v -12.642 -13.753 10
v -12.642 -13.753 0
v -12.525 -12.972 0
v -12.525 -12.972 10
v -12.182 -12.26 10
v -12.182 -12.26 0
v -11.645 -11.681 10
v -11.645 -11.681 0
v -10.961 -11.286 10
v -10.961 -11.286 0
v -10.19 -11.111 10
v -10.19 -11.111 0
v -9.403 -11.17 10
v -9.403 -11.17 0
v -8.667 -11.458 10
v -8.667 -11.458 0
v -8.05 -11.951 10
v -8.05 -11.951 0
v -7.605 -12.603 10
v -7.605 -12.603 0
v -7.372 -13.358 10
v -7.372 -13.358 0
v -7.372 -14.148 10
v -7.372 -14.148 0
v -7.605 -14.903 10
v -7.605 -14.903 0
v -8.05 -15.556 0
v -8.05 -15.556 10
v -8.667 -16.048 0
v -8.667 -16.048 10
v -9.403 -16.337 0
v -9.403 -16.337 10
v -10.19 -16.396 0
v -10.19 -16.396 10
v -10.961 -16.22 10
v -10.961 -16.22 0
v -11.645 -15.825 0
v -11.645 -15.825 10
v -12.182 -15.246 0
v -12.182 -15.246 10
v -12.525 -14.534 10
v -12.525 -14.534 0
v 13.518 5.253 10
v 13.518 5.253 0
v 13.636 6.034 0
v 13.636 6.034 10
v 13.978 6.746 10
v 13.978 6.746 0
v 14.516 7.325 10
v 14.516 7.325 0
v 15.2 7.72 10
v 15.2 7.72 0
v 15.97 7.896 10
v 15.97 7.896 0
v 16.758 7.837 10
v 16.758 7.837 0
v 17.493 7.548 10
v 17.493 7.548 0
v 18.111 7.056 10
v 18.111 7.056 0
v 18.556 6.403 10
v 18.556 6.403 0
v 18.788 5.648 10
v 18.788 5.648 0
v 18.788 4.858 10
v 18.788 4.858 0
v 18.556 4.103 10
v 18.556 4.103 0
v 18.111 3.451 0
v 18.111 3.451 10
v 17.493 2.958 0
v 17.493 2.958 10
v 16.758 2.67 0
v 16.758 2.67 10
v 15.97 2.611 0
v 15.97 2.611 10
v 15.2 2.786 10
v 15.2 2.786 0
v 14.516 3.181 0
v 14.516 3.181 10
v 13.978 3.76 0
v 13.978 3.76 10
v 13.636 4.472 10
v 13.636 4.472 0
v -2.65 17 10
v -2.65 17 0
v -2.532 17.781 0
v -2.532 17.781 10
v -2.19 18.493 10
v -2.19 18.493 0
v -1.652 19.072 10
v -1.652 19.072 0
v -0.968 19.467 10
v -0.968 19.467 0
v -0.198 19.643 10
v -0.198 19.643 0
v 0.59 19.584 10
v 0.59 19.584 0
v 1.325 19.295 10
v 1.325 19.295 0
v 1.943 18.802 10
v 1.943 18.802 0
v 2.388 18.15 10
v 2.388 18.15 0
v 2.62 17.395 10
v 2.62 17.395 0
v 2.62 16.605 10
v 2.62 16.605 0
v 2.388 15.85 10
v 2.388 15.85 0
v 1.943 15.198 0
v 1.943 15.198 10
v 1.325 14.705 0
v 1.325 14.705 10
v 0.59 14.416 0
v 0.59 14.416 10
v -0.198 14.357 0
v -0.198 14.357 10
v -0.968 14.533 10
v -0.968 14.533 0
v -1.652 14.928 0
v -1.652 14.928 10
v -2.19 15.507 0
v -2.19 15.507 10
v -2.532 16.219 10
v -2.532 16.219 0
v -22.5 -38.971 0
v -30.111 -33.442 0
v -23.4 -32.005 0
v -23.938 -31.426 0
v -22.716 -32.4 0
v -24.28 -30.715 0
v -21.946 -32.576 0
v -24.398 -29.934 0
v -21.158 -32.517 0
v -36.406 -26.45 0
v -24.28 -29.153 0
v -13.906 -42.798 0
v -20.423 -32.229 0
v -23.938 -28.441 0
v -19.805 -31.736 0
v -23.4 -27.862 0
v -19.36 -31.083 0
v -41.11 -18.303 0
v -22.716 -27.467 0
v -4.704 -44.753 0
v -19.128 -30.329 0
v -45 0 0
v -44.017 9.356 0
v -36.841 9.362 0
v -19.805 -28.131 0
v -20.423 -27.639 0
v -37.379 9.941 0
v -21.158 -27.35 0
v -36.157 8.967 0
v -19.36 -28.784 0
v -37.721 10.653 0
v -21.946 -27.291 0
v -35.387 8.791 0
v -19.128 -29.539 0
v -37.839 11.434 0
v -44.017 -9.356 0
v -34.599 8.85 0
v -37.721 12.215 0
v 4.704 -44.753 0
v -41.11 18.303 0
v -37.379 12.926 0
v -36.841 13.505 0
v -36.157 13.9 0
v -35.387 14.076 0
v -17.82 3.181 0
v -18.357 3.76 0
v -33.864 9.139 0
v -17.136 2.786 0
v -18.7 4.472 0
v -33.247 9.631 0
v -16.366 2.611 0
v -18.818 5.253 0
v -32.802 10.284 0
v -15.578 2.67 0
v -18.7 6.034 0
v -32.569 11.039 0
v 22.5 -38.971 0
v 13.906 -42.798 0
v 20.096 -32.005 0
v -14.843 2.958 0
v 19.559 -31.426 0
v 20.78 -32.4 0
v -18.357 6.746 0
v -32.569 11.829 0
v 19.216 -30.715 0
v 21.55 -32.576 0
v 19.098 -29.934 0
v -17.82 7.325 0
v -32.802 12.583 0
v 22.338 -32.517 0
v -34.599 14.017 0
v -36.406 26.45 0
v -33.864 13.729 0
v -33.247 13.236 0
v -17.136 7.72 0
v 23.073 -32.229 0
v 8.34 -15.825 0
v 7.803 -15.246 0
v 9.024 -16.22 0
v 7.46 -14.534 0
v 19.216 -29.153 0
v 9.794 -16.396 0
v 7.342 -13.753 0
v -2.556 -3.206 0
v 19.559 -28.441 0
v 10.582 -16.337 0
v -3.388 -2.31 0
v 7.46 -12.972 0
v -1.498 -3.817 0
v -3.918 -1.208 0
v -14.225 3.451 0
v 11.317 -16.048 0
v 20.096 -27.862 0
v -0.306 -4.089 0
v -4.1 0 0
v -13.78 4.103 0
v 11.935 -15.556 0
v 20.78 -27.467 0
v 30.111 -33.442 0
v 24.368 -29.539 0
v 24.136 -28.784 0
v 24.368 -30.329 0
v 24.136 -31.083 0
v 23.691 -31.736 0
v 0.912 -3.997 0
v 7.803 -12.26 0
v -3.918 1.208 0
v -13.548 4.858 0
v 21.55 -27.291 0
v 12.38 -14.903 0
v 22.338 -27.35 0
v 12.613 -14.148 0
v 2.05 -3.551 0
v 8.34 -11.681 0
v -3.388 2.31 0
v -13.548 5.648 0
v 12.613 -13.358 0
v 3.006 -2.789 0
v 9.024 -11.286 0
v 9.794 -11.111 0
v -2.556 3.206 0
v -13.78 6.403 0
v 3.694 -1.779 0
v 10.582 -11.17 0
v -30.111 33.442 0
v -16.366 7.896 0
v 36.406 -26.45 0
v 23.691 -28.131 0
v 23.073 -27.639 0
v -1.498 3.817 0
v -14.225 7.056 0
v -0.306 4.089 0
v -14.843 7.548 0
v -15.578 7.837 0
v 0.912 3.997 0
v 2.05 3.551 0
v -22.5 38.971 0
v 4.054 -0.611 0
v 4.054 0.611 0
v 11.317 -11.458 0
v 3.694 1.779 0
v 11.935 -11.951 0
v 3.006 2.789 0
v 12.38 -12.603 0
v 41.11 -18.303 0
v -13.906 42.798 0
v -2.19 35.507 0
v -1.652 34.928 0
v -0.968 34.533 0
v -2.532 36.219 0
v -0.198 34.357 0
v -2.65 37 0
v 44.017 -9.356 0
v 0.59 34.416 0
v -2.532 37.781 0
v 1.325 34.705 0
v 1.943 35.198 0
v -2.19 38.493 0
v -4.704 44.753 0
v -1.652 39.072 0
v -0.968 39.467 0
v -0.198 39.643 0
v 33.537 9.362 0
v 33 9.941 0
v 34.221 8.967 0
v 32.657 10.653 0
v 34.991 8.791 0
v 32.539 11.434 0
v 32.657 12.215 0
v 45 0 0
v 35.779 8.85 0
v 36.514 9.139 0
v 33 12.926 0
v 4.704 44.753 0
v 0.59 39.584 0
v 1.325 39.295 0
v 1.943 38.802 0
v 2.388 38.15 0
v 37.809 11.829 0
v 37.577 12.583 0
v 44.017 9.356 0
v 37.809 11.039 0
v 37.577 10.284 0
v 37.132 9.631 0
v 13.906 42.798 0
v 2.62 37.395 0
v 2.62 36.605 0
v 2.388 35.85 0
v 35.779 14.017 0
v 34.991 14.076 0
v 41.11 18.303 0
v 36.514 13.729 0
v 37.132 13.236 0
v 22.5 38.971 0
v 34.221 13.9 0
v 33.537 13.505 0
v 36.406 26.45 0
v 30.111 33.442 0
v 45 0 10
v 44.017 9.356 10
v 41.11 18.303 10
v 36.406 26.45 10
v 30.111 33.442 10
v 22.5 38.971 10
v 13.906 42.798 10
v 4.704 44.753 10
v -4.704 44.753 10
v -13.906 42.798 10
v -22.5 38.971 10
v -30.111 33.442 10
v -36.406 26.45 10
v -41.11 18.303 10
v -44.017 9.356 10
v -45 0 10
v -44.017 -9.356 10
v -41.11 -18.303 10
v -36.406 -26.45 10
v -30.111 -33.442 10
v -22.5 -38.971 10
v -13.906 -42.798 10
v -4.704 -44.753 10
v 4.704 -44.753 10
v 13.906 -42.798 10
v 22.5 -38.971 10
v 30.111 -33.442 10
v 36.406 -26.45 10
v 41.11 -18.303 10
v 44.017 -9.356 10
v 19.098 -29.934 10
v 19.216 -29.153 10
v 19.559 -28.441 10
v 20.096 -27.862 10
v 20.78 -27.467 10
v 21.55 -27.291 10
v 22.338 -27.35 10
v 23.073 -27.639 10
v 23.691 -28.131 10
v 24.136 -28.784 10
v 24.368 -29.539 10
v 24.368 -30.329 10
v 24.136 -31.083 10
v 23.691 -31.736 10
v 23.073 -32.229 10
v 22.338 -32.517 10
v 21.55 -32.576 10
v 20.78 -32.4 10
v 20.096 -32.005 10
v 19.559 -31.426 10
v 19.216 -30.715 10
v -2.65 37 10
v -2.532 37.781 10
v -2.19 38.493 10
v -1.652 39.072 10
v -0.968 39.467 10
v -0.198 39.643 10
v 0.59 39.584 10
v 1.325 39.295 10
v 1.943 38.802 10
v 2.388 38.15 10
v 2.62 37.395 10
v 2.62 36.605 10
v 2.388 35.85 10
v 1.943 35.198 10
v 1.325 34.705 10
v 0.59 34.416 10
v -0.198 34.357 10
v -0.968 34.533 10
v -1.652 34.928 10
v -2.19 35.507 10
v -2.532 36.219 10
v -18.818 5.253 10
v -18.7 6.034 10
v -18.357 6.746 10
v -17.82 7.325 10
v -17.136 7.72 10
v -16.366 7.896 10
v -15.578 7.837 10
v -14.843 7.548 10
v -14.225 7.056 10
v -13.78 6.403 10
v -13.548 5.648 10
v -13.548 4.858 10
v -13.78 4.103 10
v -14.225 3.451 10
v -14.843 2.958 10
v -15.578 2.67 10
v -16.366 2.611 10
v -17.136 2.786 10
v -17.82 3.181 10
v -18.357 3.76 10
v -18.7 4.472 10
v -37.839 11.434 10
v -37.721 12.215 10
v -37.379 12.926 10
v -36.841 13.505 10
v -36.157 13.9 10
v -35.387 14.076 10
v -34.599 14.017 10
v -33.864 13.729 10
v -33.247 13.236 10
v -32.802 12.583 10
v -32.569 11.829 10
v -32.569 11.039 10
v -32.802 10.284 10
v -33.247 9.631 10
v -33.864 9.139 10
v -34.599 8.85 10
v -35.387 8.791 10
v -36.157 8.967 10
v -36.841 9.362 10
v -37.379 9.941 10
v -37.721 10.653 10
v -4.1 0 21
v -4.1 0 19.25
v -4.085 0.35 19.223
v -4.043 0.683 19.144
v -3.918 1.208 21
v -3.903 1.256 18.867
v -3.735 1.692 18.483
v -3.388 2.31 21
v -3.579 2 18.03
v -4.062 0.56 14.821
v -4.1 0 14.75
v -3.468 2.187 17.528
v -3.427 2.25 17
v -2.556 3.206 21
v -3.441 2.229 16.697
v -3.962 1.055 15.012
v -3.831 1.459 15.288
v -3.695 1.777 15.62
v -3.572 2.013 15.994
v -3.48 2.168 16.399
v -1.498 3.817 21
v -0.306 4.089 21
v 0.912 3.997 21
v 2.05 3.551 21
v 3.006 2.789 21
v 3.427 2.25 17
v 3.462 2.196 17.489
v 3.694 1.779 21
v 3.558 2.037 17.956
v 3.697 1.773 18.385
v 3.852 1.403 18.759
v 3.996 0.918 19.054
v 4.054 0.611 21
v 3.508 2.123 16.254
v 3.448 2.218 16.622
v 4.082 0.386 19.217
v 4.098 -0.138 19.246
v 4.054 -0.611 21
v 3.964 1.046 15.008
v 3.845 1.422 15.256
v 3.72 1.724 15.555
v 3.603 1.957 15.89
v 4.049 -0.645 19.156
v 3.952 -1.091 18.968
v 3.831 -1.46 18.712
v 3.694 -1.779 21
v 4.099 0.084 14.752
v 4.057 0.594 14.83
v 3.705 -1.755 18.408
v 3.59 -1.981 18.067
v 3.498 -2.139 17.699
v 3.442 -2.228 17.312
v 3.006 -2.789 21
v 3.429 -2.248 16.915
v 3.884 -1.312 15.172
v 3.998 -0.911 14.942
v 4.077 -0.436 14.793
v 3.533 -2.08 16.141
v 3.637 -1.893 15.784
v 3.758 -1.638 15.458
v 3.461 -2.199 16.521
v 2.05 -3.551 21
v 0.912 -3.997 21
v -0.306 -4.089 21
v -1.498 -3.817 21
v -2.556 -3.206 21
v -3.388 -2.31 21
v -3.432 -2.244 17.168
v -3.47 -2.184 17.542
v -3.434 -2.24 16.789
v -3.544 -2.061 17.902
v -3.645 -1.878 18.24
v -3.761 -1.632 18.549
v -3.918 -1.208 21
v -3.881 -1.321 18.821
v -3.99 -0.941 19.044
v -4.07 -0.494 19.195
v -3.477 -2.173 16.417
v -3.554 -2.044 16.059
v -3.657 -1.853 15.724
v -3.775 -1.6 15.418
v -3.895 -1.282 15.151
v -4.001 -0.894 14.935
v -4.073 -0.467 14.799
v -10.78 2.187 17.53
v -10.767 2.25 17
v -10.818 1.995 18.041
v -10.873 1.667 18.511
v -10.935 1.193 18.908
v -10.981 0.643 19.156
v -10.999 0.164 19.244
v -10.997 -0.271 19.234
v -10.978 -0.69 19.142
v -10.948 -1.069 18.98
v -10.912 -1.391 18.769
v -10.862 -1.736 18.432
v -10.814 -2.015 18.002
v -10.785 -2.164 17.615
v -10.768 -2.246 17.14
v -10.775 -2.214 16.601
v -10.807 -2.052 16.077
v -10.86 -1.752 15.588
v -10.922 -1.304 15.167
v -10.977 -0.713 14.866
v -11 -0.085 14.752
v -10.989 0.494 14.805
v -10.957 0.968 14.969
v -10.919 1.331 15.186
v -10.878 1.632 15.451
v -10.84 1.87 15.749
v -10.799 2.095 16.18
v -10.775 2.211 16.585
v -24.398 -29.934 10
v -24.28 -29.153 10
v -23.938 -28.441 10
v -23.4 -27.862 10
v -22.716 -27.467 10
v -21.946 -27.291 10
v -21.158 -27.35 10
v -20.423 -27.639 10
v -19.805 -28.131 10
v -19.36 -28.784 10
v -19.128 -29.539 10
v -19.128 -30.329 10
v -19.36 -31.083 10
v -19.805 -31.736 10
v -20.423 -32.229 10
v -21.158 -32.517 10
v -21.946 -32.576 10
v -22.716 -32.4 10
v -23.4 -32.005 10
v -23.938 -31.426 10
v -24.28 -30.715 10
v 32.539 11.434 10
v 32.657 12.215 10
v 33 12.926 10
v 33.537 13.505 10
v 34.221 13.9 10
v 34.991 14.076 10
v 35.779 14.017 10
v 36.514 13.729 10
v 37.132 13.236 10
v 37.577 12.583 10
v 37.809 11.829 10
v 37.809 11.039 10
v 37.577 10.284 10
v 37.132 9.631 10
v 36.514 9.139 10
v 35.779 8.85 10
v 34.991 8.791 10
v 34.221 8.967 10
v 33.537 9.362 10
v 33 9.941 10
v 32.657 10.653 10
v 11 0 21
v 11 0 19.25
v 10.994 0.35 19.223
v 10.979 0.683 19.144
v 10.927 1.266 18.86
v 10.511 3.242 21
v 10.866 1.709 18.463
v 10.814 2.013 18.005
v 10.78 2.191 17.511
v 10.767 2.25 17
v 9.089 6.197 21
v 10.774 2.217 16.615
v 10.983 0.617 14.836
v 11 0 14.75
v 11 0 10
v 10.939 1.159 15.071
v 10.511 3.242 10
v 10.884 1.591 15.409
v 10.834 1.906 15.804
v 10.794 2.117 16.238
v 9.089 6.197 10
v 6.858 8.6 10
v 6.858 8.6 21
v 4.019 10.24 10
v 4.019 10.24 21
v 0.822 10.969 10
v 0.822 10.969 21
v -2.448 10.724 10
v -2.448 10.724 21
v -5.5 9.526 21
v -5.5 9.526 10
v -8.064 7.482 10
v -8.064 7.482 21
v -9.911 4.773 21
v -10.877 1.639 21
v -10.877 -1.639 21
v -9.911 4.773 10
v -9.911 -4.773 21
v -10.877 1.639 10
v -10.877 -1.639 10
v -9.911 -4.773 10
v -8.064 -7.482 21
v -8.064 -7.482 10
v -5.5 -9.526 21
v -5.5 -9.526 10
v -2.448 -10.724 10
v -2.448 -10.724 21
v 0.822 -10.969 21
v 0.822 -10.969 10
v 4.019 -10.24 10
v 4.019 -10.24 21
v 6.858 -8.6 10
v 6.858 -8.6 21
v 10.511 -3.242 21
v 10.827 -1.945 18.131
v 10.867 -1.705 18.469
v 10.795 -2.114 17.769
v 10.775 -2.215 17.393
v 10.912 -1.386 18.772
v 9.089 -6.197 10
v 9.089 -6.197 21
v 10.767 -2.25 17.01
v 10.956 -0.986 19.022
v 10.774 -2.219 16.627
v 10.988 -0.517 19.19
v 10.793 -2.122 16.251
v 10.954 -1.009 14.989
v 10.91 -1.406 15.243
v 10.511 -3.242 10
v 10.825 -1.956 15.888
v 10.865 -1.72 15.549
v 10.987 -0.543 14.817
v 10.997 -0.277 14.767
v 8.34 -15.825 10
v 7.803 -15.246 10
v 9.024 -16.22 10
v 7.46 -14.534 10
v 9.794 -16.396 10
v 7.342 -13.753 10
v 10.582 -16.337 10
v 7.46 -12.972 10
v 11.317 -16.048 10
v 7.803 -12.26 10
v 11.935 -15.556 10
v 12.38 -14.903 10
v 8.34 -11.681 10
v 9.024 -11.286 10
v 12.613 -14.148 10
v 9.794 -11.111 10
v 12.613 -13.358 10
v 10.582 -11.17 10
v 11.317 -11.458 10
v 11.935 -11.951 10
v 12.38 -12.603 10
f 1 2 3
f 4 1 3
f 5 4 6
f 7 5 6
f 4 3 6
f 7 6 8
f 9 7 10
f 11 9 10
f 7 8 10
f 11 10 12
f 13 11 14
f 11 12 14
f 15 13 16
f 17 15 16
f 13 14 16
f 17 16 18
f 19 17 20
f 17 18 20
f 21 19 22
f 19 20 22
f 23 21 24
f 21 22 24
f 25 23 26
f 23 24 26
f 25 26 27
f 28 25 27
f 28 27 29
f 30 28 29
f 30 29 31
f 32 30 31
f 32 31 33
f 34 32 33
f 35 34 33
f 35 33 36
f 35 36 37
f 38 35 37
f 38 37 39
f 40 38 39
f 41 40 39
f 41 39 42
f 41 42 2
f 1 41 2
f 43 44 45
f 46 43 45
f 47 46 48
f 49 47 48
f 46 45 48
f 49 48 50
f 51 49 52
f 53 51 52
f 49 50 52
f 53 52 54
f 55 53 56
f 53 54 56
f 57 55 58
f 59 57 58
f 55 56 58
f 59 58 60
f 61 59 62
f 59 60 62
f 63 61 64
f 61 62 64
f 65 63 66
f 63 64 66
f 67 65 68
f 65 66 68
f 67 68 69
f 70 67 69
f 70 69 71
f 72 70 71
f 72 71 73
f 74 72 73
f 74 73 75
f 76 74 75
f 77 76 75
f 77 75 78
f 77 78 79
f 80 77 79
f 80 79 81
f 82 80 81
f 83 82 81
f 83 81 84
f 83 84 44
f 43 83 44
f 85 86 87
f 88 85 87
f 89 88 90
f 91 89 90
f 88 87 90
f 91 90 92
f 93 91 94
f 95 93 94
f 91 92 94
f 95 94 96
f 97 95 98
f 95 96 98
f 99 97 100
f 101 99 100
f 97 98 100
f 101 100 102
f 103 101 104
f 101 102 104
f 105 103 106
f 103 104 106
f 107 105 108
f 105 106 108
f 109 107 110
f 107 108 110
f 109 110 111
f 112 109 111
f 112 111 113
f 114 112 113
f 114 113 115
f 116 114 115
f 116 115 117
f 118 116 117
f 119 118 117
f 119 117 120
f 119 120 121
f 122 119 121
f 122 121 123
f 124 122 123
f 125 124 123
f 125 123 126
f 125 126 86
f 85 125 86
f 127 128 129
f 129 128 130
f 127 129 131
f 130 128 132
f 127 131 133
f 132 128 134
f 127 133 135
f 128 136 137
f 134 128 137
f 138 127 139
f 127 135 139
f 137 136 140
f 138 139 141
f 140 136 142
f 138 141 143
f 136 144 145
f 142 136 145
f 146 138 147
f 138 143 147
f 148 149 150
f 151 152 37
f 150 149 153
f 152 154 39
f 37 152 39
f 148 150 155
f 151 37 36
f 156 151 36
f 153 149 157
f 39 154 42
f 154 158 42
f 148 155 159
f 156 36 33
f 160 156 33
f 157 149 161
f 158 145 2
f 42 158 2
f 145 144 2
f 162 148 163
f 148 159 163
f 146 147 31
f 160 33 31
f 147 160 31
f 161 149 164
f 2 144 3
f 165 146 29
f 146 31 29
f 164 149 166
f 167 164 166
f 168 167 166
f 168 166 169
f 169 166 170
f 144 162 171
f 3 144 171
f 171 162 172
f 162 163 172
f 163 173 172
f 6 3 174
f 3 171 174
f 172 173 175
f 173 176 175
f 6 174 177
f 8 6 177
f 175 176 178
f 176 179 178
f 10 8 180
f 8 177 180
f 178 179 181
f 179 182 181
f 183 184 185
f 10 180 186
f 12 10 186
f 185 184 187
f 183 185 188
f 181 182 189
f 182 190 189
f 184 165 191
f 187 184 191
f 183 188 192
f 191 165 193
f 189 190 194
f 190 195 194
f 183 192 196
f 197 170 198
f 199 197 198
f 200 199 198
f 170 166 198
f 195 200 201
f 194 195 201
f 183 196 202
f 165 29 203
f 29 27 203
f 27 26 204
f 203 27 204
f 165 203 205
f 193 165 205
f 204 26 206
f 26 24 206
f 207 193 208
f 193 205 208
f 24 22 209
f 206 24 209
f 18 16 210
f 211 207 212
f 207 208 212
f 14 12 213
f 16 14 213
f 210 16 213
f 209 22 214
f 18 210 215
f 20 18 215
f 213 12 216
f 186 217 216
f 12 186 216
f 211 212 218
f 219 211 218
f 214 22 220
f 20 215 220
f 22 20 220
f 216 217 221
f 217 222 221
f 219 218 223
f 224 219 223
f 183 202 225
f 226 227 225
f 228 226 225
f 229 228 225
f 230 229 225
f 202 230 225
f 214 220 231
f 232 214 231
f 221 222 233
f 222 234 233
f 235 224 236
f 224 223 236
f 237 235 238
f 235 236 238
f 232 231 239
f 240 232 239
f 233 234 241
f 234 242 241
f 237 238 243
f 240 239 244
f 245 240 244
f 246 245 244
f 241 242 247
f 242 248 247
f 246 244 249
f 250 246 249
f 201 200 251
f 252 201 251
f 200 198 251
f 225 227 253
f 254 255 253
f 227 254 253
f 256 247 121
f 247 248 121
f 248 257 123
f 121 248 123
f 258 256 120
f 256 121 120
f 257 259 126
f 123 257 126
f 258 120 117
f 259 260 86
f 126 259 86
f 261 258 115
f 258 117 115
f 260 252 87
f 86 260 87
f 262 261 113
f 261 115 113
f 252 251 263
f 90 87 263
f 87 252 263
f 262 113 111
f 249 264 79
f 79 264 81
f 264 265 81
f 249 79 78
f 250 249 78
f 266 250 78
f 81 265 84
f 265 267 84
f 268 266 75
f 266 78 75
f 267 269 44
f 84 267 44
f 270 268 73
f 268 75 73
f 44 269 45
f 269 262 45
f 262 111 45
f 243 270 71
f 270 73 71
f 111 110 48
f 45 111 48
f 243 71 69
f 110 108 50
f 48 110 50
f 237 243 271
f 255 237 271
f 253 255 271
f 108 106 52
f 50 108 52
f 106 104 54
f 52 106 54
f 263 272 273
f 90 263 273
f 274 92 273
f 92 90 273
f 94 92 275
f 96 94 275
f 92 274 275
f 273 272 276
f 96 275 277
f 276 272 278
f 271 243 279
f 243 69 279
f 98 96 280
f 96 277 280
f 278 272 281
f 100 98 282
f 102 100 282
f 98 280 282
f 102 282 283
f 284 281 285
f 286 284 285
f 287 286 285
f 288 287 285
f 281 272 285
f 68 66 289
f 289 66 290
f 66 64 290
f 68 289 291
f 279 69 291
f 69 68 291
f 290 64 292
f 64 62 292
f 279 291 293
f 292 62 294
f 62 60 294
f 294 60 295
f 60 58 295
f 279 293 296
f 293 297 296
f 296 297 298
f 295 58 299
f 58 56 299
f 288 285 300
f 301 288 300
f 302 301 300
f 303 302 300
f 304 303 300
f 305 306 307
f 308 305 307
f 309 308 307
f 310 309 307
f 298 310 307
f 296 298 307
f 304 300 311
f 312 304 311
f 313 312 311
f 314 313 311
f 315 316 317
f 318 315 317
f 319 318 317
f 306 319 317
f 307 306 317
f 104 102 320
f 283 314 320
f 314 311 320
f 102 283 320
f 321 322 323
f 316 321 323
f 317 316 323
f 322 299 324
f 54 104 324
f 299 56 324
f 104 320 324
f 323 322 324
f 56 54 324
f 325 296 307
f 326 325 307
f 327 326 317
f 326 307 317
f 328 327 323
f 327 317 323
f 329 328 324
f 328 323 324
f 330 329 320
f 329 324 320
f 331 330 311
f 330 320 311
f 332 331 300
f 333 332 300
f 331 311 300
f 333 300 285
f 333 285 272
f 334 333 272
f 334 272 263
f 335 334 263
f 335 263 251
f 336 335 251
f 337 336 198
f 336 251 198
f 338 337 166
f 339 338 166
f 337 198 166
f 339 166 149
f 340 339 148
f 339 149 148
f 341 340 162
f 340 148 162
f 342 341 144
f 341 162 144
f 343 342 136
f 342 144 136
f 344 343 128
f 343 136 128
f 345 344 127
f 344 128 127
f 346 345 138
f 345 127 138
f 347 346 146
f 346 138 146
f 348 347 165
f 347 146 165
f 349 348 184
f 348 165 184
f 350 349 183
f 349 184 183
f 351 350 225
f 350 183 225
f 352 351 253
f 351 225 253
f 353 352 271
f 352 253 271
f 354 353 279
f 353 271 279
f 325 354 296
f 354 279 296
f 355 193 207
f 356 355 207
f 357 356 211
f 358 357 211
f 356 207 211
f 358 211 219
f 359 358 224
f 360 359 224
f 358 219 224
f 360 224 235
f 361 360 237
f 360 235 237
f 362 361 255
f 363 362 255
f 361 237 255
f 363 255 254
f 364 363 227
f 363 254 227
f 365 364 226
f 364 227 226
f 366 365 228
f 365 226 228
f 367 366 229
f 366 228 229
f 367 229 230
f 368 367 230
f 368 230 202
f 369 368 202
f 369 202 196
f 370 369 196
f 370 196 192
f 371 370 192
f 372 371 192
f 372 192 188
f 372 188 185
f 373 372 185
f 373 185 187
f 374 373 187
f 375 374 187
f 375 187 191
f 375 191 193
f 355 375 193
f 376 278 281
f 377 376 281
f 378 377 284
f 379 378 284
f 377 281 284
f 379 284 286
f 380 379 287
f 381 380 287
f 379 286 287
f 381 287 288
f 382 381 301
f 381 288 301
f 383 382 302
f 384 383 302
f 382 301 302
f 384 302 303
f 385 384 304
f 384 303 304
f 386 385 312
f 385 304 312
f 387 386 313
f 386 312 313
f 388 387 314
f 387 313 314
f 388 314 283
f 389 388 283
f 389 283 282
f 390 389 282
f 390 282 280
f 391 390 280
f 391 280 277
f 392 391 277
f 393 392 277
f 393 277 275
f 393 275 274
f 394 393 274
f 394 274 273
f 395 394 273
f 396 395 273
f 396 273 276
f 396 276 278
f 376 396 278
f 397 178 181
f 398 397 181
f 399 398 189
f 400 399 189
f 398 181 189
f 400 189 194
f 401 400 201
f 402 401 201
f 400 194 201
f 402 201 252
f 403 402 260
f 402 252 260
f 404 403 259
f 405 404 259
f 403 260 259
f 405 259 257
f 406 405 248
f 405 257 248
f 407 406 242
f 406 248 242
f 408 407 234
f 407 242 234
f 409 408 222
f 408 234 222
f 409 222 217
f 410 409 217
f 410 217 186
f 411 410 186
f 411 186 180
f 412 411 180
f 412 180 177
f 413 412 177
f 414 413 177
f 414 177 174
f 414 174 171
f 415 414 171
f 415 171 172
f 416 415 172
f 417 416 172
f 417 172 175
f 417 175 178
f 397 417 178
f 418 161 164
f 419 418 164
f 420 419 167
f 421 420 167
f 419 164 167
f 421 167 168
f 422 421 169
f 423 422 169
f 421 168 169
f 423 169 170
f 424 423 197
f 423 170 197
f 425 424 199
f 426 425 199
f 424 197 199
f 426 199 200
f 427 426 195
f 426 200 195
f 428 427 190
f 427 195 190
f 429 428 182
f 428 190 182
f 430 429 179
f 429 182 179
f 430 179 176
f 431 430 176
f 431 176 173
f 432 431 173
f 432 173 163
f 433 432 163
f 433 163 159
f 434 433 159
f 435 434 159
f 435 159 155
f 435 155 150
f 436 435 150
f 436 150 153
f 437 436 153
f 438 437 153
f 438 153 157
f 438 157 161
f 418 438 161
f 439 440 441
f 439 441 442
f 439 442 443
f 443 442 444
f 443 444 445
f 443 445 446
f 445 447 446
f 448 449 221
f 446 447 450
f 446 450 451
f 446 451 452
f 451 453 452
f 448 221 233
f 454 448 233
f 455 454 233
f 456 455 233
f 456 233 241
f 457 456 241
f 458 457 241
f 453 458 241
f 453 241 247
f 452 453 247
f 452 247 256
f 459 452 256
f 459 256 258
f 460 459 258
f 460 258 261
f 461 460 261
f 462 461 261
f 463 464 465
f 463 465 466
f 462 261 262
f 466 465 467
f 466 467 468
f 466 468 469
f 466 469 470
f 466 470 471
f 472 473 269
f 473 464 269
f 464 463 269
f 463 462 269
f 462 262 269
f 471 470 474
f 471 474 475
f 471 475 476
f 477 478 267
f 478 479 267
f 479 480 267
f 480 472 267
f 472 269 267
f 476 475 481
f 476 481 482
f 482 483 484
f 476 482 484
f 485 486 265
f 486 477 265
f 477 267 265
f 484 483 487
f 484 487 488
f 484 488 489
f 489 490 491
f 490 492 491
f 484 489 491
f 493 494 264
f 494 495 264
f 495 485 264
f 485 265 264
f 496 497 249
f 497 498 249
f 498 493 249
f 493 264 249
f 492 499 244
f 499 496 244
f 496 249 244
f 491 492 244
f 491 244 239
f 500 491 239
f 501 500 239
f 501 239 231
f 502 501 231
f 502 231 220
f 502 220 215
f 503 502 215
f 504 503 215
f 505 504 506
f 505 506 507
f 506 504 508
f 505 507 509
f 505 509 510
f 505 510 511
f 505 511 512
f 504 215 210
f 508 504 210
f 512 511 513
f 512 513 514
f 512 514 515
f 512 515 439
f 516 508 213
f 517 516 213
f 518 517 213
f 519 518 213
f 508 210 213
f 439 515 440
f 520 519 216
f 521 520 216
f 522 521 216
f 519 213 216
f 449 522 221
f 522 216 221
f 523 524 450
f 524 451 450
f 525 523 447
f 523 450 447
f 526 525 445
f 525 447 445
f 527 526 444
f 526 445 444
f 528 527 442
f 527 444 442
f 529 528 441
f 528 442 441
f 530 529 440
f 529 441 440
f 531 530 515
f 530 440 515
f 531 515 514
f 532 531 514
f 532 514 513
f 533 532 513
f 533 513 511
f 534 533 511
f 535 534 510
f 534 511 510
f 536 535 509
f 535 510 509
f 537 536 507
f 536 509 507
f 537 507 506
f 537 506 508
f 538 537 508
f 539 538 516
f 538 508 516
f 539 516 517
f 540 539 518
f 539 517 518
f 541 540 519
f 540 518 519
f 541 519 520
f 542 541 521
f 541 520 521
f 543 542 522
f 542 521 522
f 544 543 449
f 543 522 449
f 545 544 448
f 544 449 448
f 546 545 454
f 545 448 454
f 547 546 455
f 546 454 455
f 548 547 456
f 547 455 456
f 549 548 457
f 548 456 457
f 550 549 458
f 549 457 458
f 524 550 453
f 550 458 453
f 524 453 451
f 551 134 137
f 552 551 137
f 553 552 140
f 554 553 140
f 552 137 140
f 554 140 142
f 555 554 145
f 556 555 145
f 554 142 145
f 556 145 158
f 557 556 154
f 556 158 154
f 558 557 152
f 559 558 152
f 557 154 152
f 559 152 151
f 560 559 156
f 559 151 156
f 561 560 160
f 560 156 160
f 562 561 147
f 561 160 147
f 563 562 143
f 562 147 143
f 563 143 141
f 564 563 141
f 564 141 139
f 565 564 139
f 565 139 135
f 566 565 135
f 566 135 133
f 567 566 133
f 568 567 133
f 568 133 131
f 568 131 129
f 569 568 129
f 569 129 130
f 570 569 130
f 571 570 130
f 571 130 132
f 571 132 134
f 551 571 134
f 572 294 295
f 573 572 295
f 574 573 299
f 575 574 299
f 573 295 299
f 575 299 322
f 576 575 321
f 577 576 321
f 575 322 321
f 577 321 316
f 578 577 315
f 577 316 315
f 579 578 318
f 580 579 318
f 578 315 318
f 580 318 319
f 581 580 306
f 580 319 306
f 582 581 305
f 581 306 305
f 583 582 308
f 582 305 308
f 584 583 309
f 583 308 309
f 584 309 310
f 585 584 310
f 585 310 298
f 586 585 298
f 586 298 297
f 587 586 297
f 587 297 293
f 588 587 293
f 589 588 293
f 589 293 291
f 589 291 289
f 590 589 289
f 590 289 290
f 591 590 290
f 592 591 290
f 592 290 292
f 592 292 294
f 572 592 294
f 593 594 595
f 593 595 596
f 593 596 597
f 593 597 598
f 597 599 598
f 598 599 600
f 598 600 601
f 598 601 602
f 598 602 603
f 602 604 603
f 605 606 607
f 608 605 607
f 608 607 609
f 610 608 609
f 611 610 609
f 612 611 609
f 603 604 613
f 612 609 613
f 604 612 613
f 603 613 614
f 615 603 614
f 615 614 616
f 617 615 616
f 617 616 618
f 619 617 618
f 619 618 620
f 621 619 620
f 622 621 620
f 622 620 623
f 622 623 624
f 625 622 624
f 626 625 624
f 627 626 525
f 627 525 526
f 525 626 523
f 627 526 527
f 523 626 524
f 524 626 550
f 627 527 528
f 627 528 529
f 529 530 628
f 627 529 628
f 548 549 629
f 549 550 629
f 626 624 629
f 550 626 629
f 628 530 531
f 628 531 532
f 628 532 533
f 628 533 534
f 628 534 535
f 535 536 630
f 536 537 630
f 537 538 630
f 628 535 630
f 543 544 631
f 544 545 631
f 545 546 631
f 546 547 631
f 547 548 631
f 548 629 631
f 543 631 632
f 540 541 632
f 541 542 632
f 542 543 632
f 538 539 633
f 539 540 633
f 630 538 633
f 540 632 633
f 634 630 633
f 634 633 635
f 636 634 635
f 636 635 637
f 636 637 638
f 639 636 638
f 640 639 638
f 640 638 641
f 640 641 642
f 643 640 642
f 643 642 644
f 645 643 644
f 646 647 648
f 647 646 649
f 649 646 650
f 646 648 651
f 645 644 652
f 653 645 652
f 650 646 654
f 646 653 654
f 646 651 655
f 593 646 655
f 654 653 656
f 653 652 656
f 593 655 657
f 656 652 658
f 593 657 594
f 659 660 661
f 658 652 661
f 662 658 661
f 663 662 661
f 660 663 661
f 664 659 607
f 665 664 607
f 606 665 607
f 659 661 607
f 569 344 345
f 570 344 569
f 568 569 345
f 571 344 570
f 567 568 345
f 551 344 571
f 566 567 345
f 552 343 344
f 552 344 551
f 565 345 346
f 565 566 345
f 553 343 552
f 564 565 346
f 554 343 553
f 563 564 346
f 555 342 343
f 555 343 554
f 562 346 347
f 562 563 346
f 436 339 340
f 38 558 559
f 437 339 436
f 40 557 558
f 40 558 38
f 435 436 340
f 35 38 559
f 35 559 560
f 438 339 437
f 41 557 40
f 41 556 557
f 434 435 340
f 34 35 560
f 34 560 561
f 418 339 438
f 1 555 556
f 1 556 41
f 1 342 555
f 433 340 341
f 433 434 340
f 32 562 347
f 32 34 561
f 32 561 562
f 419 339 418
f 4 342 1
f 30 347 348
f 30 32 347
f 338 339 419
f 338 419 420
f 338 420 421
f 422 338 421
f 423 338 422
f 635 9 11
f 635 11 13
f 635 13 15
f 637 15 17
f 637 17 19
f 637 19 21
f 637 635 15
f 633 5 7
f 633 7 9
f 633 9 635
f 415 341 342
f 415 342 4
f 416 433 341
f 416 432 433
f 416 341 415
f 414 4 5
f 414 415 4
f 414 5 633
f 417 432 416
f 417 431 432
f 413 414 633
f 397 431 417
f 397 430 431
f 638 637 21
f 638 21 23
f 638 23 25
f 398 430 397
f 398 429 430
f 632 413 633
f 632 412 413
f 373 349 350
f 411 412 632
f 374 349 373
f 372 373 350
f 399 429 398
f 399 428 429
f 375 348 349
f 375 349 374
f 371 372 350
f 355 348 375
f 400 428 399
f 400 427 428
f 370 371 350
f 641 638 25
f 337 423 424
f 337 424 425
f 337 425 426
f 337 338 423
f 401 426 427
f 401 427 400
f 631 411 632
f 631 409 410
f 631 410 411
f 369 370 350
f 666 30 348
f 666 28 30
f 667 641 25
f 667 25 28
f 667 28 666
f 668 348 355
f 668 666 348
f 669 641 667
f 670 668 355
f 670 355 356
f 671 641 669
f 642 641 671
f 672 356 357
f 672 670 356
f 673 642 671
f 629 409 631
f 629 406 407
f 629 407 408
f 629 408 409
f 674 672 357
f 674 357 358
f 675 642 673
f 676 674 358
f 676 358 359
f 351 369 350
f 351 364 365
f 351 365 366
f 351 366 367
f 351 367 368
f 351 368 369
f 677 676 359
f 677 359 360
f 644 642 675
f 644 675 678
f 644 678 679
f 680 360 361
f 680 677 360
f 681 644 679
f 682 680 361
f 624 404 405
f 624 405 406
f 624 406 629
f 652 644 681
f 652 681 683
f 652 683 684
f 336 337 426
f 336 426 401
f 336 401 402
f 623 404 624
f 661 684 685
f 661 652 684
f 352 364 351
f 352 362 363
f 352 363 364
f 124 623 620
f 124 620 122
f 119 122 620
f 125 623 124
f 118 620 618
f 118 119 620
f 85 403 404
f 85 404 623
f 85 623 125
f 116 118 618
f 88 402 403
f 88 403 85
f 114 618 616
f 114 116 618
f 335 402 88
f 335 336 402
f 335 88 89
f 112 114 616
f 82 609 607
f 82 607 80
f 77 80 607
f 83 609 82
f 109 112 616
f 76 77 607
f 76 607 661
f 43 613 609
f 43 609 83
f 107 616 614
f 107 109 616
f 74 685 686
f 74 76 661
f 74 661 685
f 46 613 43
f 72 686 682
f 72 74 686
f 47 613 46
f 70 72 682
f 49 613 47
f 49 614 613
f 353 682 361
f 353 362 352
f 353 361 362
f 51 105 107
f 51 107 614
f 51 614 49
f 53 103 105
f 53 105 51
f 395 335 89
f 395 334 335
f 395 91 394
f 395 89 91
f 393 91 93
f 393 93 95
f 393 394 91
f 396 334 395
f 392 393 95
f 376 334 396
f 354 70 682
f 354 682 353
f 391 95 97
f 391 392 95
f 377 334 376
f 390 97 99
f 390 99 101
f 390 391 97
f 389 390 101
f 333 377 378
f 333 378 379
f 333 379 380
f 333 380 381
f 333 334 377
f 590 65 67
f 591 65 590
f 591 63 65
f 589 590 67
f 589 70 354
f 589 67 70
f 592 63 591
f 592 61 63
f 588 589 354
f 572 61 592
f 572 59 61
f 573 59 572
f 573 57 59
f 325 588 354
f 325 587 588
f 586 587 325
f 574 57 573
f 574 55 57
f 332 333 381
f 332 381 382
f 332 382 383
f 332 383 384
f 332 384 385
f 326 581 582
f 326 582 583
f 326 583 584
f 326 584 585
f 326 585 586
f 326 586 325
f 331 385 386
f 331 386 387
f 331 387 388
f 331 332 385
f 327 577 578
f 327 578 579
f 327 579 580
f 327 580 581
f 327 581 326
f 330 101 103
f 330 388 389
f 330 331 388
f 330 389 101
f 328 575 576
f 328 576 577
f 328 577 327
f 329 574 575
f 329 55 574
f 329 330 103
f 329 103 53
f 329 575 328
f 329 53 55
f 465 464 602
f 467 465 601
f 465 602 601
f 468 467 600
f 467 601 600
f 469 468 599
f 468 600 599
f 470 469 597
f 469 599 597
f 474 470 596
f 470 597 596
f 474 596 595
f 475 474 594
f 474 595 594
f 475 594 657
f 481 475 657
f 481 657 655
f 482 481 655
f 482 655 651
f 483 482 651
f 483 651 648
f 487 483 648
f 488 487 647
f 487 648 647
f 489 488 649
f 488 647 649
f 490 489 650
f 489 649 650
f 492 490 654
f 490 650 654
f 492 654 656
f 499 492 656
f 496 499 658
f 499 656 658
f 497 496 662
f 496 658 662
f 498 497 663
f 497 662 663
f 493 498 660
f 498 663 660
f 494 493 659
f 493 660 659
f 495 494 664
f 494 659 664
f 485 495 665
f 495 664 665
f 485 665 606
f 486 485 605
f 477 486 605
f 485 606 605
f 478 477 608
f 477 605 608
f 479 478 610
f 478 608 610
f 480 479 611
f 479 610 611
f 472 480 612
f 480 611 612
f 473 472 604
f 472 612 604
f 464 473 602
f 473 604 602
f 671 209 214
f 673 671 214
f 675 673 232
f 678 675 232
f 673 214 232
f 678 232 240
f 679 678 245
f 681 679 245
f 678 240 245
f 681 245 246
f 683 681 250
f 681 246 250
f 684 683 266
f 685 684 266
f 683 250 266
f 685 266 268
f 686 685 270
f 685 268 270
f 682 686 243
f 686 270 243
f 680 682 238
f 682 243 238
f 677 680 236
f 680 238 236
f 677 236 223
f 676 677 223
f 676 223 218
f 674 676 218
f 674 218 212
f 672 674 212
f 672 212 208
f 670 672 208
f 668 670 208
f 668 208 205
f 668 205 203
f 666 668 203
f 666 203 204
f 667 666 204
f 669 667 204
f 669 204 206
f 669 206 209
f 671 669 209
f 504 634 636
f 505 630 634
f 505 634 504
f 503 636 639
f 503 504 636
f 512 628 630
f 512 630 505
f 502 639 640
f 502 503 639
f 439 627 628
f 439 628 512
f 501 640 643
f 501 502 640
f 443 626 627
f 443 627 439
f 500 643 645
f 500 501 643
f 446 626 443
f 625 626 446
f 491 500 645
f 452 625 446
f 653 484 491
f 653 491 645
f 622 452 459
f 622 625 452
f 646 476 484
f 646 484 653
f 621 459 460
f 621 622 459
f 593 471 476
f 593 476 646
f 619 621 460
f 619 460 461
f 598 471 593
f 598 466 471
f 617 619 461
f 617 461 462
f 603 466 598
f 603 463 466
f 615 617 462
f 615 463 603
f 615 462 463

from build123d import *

# Parameters (mm, degrees)
F0_R     = 45
F1_DEPTH = 10
F2_R     = 11
F3_DEPTH = 11
F5_D     = 8.2
F7_D     = 5.3
F8_R     = 2.25
F9_DEPTH = 50


# Not quite as in the source:
# - a feature names something its author has since deleted; it is built from what else it names


with BuildPart() as f1:
    # F0 (on Top) → F1 (new body)
    with BuildSketch(Plane.XY):
        Circle(F0_R)
    extrude(amount=F1_DEPTH)

    # F2 (on face) → F3 (join)
    with BuildSketch(Plane.XY.offset(10)):
        Circle(F2_R)
    extrude(amount=F3_DEPTH)

    # F5 (through all)
    with Locations(Plane.XY.offset(21)):
        with Locations((0, 0)):
            Hole(F5_D / 2)

    # F7 (through all)
    with Locations(Plane.XY.offset(10)):
        with Locations((0, 17), (16.167960777, 5.2532889044), (9.992349289, -13.7532889044), (-9.992349289, -13.7532889044), (-16.167960777, 5.2532889044), (35.1890911029, 11.4336287919), (21.7480543348, -29.9336287919), (-21.7480543348, -29.9336287919), (-35.1890911029, 11.4336287919), (0, 37)):
            Hole(F7_D / 2)

    # F8 (on Right) → F9 (cut, symmetric)
    with BuildSketch(Plane.YZ):
        with Locations((0, 17)):
            Circle(F8_R)
    extrude(amount=F9_DEPTH, both=True, mode=Mode.SUBTRACT)


solid = f1.part
